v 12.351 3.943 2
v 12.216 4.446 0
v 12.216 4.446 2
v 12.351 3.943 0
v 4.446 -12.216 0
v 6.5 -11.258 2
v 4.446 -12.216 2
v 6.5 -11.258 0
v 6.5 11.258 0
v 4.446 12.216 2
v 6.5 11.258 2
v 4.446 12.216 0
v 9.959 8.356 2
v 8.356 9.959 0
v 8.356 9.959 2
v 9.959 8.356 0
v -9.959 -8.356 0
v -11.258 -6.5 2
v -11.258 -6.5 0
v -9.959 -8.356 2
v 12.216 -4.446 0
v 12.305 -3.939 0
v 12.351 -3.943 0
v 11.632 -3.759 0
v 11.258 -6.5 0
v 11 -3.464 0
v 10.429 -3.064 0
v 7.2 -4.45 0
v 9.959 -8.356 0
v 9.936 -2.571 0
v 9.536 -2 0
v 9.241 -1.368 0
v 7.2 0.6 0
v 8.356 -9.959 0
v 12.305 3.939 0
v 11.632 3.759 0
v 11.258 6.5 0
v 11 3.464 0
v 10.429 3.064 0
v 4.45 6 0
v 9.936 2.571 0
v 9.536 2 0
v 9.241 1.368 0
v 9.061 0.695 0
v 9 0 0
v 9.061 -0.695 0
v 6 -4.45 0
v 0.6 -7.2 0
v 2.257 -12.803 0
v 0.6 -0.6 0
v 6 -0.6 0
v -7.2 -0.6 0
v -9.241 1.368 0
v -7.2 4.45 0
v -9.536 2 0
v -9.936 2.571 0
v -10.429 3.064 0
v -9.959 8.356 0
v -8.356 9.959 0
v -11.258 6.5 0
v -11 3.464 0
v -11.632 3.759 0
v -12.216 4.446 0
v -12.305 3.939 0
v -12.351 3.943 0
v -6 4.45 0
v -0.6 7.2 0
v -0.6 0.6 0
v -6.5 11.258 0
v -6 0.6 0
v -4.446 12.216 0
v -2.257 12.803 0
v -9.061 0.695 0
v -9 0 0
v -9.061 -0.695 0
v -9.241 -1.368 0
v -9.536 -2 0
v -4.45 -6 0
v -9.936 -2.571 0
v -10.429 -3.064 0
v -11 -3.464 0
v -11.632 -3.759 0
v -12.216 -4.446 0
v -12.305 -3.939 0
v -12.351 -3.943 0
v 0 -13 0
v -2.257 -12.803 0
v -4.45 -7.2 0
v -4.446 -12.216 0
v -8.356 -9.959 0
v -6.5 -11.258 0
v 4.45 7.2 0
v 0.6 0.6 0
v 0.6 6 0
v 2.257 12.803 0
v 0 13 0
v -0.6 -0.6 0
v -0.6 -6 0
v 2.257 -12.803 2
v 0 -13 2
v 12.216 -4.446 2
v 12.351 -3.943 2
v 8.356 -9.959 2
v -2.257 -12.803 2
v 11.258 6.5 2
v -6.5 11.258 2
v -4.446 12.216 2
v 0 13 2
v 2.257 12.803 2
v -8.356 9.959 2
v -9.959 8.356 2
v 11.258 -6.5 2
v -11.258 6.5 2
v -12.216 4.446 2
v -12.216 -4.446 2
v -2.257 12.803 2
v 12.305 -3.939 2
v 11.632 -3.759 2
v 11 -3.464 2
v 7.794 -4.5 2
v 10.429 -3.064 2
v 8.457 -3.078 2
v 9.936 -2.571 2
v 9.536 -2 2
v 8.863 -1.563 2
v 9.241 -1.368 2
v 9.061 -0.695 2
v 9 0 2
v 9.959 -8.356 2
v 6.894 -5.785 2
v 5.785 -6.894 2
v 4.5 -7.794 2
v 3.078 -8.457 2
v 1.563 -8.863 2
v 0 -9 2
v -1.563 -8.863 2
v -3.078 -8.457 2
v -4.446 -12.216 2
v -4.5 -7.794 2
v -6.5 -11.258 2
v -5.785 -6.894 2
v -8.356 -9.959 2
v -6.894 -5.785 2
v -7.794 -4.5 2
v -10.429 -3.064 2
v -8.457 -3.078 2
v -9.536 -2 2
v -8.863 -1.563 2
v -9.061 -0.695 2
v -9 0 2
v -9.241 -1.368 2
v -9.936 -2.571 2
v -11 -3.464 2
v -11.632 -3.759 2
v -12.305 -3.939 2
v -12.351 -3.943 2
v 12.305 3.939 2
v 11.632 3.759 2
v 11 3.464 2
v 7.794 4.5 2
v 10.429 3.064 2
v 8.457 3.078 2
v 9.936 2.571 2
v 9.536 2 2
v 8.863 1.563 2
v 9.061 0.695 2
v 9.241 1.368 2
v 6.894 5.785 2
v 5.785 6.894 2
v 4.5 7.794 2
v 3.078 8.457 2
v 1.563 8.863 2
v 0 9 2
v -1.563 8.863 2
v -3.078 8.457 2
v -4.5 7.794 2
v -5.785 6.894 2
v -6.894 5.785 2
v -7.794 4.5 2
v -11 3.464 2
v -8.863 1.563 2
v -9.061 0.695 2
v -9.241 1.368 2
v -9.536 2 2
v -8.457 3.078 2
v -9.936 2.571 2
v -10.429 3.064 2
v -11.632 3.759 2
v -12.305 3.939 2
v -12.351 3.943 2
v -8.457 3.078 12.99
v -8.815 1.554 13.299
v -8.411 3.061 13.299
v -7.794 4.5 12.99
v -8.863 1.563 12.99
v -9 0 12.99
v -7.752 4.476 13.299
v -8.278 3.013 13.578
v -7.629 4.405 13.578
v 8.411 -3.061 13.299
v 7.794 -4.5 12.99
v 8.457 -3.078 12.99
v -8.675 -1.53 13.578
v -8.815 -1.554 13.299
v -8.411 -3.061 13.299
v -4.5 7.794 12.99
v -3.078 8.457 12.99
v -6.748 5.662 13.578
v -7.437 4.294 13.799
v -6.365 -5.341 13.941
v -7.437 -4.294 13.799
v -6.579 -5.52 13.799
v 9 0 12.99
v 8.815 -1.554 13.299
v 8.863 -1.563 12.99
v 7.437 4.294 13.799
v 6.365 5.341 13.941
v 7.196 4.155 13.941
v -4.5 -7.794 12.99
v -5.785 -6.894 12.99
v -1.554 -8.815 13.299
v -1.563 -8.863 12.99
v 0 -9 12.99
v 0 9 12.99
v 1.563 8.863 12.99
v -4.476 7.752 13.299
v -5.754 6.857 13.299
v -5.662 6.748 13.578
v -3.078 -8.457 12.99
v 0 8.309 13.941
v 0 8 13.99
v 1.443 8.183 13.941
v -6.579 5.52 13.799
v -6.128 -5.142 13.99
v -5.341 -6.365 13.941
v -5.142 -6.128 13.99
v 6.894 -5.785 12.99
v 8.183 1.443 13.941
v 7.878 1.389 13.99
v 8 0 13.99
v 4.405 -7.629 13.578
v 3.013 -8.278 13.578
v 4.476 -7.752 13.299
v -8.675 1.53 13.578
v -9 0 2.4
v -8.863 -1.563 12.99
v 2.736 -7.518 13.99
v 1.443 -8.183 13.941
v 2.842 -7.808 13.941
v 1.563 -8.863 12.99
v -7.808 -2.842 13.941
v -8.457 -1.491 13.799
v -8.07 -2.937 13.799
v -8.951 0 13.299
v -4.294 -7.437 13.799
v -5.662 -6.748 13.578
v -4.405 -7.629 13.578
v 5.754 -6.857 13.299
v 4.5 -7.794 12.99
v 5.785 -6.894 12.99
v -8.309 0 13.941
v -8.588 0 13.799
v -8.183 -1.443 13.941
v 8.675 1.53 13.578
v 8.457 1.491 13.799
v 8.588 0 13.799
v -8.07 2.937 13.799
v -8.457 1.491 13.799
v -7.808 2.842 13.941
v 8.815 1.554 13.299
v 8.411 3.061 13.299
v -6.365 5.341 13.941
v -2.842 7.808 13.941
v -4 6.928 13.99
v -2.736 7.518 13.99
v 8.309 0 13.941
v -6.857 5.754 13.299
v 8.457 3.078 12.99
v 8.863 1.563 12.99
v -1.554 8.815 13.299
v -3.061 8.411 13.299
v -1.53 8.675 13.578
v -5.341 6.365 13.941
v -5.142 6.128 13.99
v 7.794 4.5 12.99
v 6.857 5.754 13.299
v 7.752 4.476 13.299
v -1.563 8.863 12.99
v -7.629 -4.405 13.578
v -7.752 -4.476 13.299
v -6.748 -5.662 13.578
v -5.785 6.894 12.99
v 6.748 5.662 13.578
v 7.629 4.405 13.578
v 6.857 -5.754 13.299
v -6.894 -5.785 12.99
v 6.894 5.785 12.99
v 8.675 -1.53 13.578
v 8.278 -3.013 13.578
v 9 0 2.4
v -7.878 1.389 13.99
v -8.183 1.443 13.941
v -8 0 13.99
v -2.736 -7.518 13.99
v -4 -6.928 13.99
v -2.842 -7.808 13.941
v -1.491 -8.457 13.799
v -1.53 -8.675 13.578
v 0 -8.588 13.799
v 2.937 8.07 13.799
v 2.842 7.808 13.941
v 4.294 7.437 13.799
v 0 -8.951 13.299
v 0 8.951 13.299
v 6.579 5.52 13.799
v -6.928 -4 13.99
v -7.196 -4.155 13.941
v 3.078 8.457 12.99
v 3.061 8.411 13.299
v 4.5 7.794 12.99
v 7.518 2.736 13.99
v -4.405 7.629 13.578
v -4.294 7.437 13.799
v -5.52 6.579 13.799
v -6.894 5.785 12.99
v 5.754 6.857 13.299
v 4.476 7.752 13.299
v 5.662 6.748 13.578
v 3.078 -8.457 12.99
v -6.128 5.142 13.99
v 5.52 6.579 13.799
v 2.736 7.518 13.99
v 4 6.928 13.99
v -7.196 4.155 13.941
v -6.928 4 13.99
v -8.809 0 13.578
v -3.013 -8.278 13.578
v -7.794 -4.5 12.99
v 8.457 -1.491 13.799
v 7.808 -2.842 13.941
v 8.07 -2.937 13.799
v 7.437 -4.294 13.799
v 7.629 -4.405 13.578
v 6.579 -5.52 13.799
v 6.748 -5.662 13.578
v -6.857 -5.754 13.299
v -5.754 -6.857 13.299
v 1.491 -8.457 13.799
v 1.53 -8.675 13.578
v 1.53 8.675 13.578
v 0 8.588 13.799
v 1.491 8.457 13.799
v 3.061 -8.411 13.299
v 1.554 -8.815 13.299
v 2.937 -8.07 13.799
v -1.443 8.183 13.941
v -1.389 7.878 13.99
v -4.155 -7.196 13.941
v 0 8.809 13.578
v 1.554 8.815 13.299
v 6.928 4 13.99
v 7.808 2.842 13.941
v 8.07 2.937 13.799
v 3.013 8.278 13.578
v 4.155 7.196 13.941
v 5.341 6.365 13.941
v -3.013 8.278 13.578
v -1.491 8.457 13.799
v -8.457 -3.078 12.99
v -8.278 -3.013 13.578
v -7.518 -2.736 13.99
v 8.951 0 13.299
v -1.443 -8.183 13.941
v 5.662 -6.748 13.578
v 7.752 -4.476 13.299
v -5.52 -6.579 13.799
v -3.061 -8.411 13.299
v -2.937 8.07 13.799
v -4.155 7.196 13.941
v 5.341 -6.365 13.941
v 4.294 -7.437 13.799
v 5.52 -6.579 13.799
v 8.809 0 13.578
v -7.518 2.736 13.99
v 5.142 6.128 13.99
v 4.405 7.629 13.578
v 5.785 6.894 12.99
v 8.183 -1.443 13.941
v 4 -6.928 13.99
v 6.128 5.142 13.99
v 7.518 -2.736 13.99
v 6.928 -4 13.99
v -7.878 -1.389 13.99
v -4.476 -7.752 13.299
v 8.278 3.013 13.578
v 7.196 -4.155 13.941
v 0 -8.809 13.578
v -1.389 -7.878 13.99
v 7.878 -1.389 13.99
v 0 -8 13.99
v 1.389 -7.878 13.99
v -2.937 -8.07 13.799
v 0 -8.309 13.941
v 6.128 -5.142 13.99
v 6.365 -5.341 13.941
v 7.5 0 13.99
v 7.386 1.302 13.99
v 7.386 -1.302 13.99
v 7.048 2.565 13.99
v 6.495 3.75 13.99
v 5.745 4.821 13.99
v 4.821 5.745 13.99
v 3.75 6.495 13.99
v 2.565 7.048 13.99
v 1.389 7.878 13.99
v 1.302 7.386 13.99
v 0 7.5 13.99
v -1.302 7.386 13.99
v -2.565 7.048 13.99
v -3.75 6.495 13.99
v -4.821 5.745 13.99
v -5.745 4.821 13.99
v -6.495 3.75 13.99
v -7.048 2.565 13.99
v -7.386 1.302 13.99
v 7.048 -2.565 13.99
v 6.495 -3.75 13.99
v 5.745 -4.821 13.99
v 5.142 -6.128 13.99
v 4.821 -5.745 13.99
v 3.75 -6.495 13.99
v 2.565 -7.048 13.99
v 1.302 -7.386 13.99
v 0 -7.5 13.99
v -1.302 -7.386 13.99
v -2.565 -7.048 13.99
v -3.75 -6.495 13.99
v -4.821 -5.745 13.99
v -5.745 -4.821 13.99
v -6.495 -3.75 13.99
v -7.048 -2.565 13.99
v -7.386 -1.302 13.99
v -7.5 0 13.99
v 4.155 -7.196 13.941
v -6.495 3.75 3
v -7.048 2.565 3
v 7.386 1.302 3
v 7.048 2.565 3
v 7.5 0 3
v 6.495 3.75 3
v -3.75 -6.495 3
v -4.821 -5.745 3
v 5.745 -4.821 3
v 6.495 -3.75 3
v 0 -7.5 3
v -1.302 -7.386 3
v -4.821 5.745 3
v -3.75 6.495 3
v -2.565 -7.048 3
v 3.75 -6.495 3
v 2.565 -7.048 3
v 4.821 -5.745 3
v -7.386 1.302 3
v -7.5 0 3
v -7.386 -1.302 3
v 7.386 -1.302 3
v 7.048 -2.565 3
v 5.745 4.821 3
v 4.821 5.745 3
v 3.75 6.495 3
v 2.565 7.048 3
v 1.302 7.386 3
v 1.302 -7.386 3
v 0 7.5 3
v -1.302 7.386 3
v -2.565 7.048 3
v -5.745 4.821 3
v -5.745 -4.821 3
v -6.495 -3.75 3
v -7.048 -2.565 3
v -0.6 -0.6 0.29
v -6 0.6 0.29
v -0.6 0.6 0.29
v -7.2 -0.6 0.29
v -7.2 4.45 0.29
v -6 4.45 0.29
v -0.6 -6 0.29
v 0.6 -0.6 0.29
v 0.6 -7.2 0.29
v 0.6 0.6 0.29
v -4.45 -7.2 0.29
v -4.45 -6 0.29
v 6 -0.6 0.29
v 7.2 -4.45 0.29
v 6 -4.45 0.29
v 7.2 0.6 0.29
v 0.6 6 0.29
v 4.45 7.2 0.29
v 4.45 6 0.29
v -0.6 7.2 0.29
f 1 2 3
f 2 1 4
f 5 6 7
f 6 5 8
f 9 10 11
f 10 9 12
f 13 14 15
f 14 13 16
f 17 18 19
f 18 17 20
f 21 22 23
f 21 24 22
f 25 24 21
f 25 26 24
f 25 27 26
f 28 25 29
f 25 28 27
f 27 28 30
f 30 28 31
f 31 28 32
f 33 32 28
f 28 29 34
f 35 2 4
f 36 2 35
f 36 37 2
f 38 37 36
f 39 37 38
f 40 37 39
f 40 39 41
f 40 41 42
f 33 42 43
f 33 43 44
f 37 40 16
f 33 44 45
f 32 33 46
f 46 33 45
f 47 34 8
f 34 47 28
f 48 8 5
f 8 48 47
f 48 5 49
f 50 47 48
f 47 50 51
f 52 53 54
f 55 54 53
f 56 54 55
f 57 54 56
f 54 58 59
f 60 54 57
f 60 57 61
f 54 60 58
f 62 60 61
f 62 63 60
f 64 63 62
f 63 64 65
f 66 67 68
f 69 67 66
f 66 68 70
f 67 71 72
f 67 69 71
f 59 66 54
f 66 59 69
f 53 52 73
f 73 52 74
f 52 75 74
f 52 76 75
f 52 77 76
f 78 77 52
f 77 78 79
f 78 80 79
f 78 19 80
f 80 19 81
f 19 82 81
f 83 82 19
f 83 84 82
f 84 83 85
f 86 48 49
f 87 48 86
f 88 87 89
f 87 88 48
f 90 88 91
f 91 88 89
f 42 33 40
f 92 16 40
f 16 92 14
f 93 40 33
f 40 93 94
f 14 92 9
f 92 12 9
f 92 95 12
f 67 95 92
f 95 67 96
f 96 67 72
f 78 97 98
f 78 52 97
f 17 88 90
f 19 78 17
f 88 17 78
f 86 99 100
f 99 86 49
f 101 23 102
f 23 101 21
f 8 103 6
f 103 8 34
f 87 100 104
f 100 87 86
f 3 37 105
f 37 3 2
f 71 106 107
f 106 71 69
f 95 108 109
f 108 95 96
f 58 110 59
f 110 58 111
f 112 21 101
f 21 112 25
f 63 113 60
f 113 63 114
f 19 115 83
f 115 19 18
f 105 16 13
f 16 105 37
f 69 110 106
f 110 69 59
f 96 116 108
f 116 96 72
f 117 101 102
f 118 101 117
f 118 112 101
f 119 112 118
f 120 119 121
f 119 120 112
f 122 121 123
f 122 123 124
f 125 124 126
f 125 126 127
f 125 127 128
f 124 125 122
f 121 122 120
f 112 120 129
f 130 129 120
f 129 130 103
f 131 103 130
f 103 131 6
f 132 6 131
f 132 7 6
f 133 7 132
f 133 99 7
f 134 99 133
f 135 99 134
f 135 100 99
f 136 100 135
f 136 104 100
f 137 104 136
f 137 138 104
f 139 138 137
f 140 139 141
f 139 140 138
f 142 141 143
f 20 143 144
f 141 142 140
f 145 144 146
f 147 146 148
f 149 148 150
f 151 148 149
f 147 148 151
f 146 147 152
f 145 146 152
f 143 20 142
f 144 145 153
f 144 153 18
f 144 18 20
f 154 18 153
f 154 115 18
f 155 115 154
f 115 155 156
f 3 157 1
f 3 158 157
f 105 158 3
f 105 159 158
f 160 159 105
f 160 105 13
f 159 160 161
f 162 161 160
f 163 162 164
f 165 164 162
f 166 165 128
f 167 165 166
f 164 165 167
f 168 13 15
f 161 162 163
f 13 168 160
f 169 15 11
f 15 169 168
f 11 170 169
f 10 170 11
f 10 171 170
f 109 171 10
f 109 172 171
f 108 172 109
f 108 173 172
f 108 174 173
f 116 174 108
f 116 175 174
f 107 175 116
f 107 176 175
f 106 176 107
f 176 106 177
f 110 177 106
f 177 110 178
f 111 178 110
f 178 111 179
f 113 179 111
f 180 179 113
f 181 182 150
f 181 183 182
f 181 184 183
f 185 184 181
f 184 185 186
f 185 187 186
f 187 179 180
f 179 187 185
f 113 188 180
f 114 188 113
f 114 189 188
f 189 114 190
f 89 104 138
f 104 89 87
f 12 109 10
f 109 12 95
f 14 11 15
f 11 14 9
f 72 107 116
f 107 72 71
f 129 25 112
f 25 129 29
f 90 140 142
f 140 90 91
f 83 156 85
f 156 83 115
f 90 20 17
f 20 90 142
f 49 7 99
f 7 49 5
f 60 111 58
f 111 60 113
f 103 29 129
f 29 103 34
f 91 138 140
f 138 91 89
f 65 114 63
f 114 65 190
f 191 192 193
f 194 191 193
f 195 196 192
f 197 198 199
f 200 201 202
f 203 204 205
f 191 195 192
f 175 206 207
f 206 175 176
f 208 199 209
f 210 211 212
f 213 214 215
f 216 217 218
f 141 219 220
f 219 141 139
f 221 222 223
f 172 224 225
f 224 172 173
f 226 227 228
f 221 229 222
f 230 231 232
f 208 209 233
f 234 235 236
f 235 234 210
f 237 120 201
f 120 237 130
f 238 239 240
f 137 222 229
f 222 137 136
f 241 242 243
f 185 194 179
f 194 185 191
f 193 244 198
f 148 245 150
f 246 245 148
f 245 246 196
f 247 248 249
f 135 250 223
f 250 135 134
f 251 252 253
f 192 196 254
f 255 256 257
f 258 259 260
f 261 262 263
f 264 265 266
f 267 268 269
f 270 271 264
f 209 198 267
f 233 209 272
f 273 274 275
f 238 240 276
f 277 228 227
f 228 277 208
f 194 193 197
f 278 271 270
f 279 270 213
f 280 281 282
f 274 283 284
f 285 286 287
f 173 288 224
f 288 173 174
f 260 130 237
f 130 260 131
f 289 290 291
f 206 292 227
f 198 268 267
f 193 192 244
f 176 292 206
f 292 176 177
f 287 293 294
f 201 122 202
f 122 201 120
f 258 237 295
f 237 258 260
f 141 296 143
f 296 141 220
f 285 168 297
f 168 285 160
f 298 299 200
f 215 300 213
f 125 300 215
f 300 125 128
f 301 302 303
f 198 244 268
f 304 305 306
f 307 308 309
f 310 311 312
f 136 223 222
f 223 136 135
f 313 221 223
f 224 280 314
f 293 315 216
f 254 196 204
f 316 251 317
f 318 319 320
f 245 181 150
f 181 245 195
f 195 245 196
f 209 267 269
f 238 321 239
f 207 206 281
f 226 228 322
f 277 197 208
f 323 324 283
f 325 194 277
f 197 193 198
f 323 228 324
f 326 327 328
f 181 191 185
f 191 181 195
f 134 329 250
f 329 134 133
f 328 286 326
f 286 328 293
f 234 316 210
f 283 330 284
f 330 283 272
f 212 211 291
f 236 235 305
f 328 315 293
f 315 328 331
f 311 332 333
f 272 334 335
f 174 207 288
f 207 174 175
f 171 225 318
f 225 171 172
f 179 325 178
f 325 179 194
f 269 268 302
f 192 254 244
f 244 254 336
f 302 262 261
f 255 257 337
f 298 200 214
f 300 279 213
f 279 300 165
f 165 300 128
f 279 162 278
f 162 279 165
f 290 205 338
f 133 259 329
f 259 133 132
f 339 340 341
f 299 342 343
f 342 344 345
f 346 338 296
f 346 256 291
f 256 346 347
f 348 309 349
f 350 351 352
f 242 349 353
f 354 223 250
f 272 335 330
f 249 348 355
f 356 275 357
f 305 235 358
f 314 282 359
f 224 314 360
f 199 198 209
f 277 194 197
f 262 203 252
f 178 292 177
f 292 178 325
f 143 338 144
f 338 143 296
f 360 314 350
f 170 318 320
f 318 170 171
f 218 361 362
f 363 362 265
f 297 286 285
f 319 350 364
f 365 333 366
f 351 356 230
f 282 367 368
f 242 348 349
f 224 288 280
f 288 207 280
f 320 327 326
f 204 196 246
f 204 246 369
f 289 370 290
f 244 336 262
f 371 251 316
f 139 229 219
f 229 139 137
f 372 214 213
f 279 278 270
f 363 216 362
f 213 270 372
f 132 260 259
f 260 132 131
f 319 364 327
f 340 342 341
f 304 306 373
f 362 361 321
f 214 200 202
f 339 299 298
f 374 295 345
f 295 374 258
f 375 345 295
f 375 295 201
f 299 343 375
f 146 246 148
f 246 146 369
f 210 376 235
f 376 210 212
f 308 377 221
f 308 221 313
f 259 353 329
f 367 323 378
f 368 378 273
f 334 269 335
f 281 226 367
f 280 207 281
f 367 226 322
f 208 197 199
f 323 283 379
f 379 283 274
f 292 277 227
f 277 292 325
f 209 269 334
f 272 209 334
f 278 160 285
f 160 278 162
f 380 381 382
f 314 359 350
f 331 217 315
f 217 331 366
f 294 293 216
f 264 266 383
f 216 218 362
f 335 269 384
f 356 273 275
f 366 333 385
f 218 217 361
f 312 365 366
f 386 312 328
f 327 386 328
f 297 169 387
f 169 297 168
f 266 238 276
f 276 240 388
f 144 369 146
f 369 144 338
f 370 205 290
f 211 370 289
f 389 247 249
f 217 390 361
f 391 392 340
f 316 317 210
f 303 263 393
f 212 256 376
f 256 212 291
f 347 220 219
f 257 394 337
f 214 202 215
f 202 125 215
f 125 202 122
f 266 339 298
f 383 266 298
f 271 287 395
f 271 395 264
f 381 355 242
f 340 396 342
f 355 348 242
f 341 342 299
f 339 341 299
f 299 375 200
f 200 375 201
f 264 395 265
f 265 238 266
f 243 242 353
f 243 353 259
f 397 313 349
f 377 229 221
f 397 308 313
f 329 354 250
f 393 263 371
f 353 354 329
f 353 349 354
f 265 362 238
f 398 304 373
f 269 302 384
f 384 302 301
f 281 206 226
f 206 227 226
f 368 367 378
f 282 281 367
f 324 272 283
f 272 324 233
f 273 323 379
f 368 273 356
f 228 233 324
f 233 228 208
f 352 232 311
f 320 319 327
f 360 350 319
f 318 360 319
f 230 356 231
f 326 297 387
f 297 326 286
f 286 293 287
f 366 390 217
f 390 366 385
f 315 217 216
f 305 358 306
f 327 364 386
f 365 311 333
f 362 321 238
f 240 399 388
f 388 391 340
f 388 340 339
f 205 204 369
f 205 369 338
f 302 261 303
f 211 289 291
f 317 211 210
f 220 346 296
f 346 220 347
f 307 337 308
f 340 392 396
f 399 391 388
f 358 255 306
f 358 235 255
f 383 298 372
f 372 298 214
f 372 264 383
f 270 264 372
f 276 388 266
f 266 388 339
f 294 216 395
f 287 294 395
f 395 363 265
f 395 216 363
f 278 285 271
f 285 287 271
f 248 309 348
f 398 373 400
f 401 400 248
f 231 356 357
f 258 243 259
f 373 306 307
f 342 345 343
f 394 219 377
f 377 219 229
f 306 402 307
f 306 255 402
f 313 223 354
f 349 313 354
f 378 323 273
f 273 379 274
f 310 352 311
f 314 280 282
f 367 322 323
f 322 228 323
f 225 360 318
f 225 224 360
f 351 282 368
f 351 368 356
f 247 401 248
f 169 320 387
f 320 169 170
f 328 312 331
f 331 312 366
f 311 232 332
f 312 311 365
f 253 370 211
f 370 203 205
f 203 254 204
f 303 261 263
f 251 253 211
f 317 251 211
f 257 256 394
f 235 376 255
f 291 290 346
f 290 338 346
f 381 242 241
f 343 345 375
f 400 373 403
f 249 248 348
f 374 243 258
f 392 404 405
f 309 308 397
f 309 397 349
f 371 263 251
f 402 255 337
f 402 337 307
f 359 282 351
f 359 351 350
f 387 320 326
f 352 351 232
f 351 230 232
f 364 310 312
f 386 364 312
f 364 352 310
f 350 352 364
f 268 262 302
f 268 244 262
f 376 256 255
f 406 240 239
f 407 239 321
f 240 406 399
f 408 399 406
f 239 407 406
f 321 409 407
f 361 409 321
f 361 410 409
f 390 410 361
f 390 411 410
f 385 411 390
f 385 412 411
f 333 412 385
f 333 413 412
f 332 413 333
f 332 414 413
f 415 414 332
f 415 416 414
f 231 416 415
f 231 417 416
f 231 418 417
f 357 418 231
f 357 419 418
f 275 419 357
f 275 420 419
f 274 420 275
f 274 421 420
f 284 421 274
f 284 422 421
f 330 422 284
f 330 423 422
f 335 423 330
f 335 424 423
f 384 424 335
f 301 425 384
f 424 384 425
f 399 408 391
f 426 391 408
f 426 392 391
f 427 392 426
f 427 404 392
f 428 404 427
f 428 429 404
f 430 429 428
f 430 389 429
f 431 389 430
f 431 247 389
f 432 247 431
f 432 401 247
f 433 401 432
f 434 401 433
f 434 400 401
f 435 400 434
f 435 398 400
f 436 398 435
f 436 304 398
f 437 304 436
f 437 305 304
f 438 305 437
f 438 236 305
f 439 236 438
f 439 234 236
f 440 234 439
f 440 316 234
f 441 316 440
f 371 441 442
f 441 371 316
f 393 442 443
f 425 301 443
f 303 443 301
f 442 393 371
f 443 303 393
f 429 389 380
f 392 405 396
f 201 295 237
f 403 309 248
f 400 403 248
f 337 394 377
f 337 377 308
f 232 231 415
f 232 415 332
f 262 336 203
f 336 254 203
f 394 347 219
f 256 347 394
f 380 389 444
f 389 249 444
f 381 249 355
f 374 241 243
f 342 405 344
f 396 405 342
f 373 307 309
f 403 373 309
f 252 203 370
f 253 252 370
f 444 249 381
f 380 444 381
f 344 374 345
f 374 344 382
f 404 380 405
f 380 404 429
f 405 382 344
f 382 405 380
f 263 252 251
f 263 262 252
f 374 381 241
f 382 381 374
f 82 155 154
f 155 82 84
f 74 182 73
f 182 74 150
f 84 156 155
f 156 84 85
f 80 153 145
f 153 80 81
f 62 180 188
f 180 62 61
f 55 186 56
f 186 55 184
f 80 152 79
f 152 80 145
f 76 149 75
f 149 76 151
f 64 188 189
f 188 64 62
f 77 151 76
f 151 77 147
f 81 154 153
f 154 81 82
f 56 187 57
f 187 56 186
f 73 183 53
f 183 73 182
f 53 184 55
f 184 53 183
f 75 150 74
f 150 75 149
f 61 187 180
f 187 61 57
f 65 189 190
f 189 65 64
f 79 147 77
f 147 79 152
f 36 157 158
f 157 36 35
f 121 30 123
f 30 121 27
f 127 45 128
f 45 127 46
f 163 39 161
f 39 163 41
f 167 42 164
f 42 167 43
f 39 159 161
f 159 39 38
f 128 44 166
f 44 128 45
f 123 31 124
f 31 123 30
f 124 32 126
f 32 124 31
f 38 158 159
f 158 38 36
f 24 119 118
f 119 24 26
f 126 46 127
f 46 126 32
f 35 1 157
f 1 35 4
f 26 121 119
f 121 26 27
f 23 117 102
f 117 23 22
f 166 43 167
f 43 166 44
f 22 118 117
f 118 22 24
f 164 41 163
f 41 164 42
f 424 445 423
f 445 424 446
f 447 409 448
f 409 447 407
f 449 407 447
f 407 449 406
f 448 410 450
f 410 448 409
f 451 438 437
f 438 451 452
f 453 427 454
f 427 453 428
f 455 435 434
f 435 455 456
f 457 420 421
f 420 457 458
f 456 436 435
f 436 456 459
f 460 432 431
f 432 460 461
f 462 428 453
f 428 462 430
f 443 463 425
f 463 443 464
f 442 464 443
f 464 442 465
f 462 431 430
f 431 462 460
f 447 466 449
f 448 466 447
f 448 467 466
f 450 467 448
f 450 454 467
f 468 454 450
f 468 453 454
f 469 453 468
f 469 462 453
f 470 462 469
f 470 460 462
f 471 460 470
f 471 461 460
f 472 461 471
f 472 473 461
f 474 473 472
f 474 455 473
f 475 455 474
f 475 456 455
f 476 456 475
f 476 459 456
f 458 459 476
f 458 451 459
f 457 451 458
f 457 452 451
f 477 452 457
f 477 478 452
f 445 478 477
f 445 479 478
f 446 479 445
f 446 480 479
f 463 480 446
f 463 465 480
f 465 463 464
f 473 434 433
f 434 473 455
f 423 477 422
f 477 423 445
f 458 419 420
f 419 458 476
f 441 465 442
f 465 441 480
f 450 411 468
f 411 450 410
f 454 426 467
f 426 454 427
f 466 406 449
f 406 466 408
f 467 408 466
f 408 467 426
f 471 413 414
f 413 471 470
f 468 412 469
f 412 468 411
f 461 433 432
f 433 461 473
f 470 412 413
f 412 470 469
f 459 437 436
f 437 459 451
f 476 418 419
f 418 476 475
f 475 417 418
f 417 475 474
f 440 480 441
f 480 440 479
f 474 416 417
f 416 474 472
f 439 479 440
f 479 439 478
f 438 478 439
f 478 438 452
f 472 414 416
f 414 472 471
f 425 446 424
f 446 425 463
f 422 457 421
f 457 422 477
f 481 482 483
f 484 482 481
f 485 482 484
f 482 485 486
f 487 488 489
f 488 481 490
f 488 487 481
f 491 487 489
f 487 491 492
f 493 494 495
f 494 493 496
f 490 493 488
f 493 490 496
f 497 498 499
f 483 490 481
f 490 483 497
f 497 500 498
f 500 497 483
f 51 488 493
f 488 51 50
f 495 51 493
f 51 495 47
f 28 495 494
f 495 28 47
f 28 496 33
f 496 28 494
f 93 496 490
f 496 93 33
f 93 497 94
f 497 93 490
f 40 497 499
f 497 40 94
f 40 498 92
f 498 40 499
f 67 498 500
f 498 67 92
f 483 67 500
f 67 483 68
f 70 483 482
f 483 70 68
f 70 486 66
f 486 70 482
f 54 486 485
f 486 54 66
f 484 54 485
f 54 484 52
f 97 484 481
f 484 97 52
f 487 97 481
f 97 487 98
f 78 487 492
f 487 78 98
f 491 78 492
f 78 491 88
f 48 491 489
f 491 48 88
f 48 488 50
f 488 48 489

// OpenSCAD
// file: ../../lib/maths.scad
pi = 3.14159265358979;


////// PARABOLAS //////

//Standard parabola
function parabolaPoint(x, k) = k * x * x;

//Focal point equals Y where derivative of parabolaPoint is 1.
function focal_length(k) = parabolaPoint(0.5 / k, k);

//Cup shape
module outer_parabola(width, k, segments, base_thickness = 1) {
    for(i = [-segments:1:segments - 1]) {
        x1 = i * width / segments;
        x2 = (i + 1) * width / segments;
        polygon([[x1, -base_thickness], [x1, parabolaPoint(x1, k)],
            [x2, parabolaPoint(x2, k)], [x2, -base_thickness]],
            [[3, 2, 1, 0]]);
    }
}

//Bulge shape
module inner_parabola(width, k, segments) {
    assign(max_y = parabolaPoint(width, k))
    for(i = [-segments:1:segments - 1]) {
        x1 = i * width / segments;
        x2 = (i + 1) * width / segments;
        polygon([[x1, max_y], [x1, parabolaPoint(x1, k)],
            [x2, parabolaPoint(x2, k)], [x2, max_y]],
            [[0, 1, 2, 3]]);
    }
}

module parabolic_trough (length, width, k, segments) {
    rotate([90, 0, 90])
    linear_extrude(length, $fn = segments * 4)
    outer_parabola(width, k, segments);
}

module parabolic_dish (width, k, segments) {
    rotate_extrude($fn = segments * 4)
    intersection() {
        outer_parabola(width, k, segments);
        translate([0, -1])
        square([width + 1, parabolaPoint(width, k) + 2]);
    }
}

module parabolic_shell (width, k, segments, thickness) {
    rotate_extrude($fn = segments * 4)
    difference() {
        intersection() {
            outer_parabola(width, k, segments);
            translate([0, -1])
            square([width + 1, parabolaPoint(width, k) + 2]);
        }
        translate([0, -thickness])
        intersection() {
            outer_parabola(width, k, segments);
            translate([0, -1])
            square([width + 1, parabolaPoint(width, k) + 2]);
        }
    }
}

////////////////////////////////

// linear_extrude(1) outer_parabola(10, 0.2, segments = 20);

// color("green")
// linear_extrude(0.5) inner_parabola(10, 0.2, segments = 20);

// echo(str("Focal length = ", focal_length(0.2)));
// color("white")
// translate([0, focal_length(0.2)])
// cylinder(r = 0.25, $fn=20);

// translate([-10, 32, 0])
// parabolic_trough(20, 10, 0.1, 5);

// translate([0, 54, 0])
// parabolic_dish(10, 0.05, 5);

///////////////////////
//// END PARABOLAS ////
///////////////////////
// file: ../../lib/rounded_primitives.scad
// Rounded primitives for openscad
// (c) 2013 Wouter Robers

// Include line to copy/paste:
// include <../../lib/rounded_primitives.scad>;

// Syntax example for a rounded block
//translate([-15,0,10]) rcube([20,20,20],2);

// Syntax example for a rounded cylinder
//translate([15,0,10]) rcylinder(r1=15,r2=10,h=20,b=2);

use <maths.scad>;



module rcube(Size=[20,20,20],b=2) {
    hull() {
        for (x=[-(Size[0]/2-b),(Size[0]/2-b)]){
            for (y=[-(Size[1]/2-b),(Size[1]/2-b)]) {
                for (z=[-(Size[2]/2-b),(Size[2]/2-b)]) {
                    translate([x,y,z])
                    sphere(b);
                }
            }
        }
    }
}


module rcylinder(r1=10, r2=10, h=10, b=2, center=false, fn=20, oneSide=false) {
    t = center ? -h/2 : 0;
    facets = oneSide ? 4 : fn;
    translate([0,0,t])
    hull() {
        rotate_extrude()
            translate([r1-b,b,0])
                if (oneSide) {
                    square(2*b, center=true);
                } else {
                    circle(r=b, $fn=fn);
                }
        rotate_extrude()
            translate([r2-b, h-b, 0])
                circle(r=b, $fn=fn);
    }
}

module rEquilateralTriangle(side=10, height=10, b=2, center=true) {
    d = sideLengthFromPolygonInRadius(3, b);
    dd = polygonCircumRadius(3, d);
    inRadius = polygonInRadius(3, side);
    echo(d=d);
    echo(dd=dd);
    translate(center==true ? [-side/2,-inRadius,-height/2] : [0,0,0])
    linear_extrude(height=height)
        hull() {
            translate([d/2, b]) circle(b);
            translate([side-(d/2), b]) circle(b);
            translate([side/2, (sqrt(3)*side/2)-dd]) circle(b);
        }
}
// main file
// Djed Bouchon Paulo

diamExterieur = 18;
diamInterieur = 15;
hauteur = 12;
diamBase = 26;
epaisseurBase = 2;
epaisseurGravure = 0.2;

include <../../lib/rounded_primitives.scad>;

e = 0.01;
$fn = 36;


bouchon();

// gravure_Svastika(sens=2);

module gravure_Svastika(sens="dextro") {
    translate([0,0,-e])
    scale([0.3, 0.3])
    if (sens == "dextro") {
        mirror([1, 0, 0]) Svastika();
    } else {
        Svastika();
    }
}

module Svastika() {
    ep = 2; // demi-epaisseur
    h = 24; // hauteur
    l = h/1.618; // longueur "ailettes"

    linear_extrude(height=0.3)
    polygon([[l, h], [-ep, h], [-ep, ep], [-h+2*ep, ep],
    [-h+2*ep, l], [-h, l], [-h, -ep], [-ep, -ep],
    [-ep, -h+2*ep], [-l, -h+2*ep], [-l, -h], [ep, -h],
    [ep, -ep], [h-2*ep, -ep], [h-2*ep, -l], [h, -l],
    [h, ep], [ep, ep], [ep, h-2*ep], [l, h-2*ep], [l, h]]);
}

module gravure_Djed() {
    translate([0,1, -1+epaisseurGravure])
    scale(0.1, 0.1, 1) {
        linear_extrude(height=10) {
            mirror([1,0,0])
            sketch();
            sketch();
        }
    }
}

module sketch() {
        translate([-2, 0])
        import(file = "../Djed_v1.dxf");
}

module bouchon() {
    difference() {
        union() {
            cylinder(h=epaisseurBase, d=diamBase, center=false);
            translate([0, 0, epaisseurBase-e])
            rcylinder(r1=diamExterieur/2, r2=diamExterieur/2, h=hauteur, b=1, center=false, fn=20, oneSide=true);
            // cylinder(h=hauteur+epaisseurBase, d=diamExterieur, center=false);
        }
        translate([0,0, epaisseurBase+1])
            cylinder(h=hauteur+1, d=diamInterieur, center=false);
        for (i= [1:2]) {
        rotate([0,0,i*180]) translate([diamBase/2, 0, -0.6])
            cylinder(h=epaisseurBase+1, r=(diamBase-diamExterieur)/2, center=false);
        }
        // gravure_Djed();
        gravure_Svastika(sens="dextr");
    }
}
